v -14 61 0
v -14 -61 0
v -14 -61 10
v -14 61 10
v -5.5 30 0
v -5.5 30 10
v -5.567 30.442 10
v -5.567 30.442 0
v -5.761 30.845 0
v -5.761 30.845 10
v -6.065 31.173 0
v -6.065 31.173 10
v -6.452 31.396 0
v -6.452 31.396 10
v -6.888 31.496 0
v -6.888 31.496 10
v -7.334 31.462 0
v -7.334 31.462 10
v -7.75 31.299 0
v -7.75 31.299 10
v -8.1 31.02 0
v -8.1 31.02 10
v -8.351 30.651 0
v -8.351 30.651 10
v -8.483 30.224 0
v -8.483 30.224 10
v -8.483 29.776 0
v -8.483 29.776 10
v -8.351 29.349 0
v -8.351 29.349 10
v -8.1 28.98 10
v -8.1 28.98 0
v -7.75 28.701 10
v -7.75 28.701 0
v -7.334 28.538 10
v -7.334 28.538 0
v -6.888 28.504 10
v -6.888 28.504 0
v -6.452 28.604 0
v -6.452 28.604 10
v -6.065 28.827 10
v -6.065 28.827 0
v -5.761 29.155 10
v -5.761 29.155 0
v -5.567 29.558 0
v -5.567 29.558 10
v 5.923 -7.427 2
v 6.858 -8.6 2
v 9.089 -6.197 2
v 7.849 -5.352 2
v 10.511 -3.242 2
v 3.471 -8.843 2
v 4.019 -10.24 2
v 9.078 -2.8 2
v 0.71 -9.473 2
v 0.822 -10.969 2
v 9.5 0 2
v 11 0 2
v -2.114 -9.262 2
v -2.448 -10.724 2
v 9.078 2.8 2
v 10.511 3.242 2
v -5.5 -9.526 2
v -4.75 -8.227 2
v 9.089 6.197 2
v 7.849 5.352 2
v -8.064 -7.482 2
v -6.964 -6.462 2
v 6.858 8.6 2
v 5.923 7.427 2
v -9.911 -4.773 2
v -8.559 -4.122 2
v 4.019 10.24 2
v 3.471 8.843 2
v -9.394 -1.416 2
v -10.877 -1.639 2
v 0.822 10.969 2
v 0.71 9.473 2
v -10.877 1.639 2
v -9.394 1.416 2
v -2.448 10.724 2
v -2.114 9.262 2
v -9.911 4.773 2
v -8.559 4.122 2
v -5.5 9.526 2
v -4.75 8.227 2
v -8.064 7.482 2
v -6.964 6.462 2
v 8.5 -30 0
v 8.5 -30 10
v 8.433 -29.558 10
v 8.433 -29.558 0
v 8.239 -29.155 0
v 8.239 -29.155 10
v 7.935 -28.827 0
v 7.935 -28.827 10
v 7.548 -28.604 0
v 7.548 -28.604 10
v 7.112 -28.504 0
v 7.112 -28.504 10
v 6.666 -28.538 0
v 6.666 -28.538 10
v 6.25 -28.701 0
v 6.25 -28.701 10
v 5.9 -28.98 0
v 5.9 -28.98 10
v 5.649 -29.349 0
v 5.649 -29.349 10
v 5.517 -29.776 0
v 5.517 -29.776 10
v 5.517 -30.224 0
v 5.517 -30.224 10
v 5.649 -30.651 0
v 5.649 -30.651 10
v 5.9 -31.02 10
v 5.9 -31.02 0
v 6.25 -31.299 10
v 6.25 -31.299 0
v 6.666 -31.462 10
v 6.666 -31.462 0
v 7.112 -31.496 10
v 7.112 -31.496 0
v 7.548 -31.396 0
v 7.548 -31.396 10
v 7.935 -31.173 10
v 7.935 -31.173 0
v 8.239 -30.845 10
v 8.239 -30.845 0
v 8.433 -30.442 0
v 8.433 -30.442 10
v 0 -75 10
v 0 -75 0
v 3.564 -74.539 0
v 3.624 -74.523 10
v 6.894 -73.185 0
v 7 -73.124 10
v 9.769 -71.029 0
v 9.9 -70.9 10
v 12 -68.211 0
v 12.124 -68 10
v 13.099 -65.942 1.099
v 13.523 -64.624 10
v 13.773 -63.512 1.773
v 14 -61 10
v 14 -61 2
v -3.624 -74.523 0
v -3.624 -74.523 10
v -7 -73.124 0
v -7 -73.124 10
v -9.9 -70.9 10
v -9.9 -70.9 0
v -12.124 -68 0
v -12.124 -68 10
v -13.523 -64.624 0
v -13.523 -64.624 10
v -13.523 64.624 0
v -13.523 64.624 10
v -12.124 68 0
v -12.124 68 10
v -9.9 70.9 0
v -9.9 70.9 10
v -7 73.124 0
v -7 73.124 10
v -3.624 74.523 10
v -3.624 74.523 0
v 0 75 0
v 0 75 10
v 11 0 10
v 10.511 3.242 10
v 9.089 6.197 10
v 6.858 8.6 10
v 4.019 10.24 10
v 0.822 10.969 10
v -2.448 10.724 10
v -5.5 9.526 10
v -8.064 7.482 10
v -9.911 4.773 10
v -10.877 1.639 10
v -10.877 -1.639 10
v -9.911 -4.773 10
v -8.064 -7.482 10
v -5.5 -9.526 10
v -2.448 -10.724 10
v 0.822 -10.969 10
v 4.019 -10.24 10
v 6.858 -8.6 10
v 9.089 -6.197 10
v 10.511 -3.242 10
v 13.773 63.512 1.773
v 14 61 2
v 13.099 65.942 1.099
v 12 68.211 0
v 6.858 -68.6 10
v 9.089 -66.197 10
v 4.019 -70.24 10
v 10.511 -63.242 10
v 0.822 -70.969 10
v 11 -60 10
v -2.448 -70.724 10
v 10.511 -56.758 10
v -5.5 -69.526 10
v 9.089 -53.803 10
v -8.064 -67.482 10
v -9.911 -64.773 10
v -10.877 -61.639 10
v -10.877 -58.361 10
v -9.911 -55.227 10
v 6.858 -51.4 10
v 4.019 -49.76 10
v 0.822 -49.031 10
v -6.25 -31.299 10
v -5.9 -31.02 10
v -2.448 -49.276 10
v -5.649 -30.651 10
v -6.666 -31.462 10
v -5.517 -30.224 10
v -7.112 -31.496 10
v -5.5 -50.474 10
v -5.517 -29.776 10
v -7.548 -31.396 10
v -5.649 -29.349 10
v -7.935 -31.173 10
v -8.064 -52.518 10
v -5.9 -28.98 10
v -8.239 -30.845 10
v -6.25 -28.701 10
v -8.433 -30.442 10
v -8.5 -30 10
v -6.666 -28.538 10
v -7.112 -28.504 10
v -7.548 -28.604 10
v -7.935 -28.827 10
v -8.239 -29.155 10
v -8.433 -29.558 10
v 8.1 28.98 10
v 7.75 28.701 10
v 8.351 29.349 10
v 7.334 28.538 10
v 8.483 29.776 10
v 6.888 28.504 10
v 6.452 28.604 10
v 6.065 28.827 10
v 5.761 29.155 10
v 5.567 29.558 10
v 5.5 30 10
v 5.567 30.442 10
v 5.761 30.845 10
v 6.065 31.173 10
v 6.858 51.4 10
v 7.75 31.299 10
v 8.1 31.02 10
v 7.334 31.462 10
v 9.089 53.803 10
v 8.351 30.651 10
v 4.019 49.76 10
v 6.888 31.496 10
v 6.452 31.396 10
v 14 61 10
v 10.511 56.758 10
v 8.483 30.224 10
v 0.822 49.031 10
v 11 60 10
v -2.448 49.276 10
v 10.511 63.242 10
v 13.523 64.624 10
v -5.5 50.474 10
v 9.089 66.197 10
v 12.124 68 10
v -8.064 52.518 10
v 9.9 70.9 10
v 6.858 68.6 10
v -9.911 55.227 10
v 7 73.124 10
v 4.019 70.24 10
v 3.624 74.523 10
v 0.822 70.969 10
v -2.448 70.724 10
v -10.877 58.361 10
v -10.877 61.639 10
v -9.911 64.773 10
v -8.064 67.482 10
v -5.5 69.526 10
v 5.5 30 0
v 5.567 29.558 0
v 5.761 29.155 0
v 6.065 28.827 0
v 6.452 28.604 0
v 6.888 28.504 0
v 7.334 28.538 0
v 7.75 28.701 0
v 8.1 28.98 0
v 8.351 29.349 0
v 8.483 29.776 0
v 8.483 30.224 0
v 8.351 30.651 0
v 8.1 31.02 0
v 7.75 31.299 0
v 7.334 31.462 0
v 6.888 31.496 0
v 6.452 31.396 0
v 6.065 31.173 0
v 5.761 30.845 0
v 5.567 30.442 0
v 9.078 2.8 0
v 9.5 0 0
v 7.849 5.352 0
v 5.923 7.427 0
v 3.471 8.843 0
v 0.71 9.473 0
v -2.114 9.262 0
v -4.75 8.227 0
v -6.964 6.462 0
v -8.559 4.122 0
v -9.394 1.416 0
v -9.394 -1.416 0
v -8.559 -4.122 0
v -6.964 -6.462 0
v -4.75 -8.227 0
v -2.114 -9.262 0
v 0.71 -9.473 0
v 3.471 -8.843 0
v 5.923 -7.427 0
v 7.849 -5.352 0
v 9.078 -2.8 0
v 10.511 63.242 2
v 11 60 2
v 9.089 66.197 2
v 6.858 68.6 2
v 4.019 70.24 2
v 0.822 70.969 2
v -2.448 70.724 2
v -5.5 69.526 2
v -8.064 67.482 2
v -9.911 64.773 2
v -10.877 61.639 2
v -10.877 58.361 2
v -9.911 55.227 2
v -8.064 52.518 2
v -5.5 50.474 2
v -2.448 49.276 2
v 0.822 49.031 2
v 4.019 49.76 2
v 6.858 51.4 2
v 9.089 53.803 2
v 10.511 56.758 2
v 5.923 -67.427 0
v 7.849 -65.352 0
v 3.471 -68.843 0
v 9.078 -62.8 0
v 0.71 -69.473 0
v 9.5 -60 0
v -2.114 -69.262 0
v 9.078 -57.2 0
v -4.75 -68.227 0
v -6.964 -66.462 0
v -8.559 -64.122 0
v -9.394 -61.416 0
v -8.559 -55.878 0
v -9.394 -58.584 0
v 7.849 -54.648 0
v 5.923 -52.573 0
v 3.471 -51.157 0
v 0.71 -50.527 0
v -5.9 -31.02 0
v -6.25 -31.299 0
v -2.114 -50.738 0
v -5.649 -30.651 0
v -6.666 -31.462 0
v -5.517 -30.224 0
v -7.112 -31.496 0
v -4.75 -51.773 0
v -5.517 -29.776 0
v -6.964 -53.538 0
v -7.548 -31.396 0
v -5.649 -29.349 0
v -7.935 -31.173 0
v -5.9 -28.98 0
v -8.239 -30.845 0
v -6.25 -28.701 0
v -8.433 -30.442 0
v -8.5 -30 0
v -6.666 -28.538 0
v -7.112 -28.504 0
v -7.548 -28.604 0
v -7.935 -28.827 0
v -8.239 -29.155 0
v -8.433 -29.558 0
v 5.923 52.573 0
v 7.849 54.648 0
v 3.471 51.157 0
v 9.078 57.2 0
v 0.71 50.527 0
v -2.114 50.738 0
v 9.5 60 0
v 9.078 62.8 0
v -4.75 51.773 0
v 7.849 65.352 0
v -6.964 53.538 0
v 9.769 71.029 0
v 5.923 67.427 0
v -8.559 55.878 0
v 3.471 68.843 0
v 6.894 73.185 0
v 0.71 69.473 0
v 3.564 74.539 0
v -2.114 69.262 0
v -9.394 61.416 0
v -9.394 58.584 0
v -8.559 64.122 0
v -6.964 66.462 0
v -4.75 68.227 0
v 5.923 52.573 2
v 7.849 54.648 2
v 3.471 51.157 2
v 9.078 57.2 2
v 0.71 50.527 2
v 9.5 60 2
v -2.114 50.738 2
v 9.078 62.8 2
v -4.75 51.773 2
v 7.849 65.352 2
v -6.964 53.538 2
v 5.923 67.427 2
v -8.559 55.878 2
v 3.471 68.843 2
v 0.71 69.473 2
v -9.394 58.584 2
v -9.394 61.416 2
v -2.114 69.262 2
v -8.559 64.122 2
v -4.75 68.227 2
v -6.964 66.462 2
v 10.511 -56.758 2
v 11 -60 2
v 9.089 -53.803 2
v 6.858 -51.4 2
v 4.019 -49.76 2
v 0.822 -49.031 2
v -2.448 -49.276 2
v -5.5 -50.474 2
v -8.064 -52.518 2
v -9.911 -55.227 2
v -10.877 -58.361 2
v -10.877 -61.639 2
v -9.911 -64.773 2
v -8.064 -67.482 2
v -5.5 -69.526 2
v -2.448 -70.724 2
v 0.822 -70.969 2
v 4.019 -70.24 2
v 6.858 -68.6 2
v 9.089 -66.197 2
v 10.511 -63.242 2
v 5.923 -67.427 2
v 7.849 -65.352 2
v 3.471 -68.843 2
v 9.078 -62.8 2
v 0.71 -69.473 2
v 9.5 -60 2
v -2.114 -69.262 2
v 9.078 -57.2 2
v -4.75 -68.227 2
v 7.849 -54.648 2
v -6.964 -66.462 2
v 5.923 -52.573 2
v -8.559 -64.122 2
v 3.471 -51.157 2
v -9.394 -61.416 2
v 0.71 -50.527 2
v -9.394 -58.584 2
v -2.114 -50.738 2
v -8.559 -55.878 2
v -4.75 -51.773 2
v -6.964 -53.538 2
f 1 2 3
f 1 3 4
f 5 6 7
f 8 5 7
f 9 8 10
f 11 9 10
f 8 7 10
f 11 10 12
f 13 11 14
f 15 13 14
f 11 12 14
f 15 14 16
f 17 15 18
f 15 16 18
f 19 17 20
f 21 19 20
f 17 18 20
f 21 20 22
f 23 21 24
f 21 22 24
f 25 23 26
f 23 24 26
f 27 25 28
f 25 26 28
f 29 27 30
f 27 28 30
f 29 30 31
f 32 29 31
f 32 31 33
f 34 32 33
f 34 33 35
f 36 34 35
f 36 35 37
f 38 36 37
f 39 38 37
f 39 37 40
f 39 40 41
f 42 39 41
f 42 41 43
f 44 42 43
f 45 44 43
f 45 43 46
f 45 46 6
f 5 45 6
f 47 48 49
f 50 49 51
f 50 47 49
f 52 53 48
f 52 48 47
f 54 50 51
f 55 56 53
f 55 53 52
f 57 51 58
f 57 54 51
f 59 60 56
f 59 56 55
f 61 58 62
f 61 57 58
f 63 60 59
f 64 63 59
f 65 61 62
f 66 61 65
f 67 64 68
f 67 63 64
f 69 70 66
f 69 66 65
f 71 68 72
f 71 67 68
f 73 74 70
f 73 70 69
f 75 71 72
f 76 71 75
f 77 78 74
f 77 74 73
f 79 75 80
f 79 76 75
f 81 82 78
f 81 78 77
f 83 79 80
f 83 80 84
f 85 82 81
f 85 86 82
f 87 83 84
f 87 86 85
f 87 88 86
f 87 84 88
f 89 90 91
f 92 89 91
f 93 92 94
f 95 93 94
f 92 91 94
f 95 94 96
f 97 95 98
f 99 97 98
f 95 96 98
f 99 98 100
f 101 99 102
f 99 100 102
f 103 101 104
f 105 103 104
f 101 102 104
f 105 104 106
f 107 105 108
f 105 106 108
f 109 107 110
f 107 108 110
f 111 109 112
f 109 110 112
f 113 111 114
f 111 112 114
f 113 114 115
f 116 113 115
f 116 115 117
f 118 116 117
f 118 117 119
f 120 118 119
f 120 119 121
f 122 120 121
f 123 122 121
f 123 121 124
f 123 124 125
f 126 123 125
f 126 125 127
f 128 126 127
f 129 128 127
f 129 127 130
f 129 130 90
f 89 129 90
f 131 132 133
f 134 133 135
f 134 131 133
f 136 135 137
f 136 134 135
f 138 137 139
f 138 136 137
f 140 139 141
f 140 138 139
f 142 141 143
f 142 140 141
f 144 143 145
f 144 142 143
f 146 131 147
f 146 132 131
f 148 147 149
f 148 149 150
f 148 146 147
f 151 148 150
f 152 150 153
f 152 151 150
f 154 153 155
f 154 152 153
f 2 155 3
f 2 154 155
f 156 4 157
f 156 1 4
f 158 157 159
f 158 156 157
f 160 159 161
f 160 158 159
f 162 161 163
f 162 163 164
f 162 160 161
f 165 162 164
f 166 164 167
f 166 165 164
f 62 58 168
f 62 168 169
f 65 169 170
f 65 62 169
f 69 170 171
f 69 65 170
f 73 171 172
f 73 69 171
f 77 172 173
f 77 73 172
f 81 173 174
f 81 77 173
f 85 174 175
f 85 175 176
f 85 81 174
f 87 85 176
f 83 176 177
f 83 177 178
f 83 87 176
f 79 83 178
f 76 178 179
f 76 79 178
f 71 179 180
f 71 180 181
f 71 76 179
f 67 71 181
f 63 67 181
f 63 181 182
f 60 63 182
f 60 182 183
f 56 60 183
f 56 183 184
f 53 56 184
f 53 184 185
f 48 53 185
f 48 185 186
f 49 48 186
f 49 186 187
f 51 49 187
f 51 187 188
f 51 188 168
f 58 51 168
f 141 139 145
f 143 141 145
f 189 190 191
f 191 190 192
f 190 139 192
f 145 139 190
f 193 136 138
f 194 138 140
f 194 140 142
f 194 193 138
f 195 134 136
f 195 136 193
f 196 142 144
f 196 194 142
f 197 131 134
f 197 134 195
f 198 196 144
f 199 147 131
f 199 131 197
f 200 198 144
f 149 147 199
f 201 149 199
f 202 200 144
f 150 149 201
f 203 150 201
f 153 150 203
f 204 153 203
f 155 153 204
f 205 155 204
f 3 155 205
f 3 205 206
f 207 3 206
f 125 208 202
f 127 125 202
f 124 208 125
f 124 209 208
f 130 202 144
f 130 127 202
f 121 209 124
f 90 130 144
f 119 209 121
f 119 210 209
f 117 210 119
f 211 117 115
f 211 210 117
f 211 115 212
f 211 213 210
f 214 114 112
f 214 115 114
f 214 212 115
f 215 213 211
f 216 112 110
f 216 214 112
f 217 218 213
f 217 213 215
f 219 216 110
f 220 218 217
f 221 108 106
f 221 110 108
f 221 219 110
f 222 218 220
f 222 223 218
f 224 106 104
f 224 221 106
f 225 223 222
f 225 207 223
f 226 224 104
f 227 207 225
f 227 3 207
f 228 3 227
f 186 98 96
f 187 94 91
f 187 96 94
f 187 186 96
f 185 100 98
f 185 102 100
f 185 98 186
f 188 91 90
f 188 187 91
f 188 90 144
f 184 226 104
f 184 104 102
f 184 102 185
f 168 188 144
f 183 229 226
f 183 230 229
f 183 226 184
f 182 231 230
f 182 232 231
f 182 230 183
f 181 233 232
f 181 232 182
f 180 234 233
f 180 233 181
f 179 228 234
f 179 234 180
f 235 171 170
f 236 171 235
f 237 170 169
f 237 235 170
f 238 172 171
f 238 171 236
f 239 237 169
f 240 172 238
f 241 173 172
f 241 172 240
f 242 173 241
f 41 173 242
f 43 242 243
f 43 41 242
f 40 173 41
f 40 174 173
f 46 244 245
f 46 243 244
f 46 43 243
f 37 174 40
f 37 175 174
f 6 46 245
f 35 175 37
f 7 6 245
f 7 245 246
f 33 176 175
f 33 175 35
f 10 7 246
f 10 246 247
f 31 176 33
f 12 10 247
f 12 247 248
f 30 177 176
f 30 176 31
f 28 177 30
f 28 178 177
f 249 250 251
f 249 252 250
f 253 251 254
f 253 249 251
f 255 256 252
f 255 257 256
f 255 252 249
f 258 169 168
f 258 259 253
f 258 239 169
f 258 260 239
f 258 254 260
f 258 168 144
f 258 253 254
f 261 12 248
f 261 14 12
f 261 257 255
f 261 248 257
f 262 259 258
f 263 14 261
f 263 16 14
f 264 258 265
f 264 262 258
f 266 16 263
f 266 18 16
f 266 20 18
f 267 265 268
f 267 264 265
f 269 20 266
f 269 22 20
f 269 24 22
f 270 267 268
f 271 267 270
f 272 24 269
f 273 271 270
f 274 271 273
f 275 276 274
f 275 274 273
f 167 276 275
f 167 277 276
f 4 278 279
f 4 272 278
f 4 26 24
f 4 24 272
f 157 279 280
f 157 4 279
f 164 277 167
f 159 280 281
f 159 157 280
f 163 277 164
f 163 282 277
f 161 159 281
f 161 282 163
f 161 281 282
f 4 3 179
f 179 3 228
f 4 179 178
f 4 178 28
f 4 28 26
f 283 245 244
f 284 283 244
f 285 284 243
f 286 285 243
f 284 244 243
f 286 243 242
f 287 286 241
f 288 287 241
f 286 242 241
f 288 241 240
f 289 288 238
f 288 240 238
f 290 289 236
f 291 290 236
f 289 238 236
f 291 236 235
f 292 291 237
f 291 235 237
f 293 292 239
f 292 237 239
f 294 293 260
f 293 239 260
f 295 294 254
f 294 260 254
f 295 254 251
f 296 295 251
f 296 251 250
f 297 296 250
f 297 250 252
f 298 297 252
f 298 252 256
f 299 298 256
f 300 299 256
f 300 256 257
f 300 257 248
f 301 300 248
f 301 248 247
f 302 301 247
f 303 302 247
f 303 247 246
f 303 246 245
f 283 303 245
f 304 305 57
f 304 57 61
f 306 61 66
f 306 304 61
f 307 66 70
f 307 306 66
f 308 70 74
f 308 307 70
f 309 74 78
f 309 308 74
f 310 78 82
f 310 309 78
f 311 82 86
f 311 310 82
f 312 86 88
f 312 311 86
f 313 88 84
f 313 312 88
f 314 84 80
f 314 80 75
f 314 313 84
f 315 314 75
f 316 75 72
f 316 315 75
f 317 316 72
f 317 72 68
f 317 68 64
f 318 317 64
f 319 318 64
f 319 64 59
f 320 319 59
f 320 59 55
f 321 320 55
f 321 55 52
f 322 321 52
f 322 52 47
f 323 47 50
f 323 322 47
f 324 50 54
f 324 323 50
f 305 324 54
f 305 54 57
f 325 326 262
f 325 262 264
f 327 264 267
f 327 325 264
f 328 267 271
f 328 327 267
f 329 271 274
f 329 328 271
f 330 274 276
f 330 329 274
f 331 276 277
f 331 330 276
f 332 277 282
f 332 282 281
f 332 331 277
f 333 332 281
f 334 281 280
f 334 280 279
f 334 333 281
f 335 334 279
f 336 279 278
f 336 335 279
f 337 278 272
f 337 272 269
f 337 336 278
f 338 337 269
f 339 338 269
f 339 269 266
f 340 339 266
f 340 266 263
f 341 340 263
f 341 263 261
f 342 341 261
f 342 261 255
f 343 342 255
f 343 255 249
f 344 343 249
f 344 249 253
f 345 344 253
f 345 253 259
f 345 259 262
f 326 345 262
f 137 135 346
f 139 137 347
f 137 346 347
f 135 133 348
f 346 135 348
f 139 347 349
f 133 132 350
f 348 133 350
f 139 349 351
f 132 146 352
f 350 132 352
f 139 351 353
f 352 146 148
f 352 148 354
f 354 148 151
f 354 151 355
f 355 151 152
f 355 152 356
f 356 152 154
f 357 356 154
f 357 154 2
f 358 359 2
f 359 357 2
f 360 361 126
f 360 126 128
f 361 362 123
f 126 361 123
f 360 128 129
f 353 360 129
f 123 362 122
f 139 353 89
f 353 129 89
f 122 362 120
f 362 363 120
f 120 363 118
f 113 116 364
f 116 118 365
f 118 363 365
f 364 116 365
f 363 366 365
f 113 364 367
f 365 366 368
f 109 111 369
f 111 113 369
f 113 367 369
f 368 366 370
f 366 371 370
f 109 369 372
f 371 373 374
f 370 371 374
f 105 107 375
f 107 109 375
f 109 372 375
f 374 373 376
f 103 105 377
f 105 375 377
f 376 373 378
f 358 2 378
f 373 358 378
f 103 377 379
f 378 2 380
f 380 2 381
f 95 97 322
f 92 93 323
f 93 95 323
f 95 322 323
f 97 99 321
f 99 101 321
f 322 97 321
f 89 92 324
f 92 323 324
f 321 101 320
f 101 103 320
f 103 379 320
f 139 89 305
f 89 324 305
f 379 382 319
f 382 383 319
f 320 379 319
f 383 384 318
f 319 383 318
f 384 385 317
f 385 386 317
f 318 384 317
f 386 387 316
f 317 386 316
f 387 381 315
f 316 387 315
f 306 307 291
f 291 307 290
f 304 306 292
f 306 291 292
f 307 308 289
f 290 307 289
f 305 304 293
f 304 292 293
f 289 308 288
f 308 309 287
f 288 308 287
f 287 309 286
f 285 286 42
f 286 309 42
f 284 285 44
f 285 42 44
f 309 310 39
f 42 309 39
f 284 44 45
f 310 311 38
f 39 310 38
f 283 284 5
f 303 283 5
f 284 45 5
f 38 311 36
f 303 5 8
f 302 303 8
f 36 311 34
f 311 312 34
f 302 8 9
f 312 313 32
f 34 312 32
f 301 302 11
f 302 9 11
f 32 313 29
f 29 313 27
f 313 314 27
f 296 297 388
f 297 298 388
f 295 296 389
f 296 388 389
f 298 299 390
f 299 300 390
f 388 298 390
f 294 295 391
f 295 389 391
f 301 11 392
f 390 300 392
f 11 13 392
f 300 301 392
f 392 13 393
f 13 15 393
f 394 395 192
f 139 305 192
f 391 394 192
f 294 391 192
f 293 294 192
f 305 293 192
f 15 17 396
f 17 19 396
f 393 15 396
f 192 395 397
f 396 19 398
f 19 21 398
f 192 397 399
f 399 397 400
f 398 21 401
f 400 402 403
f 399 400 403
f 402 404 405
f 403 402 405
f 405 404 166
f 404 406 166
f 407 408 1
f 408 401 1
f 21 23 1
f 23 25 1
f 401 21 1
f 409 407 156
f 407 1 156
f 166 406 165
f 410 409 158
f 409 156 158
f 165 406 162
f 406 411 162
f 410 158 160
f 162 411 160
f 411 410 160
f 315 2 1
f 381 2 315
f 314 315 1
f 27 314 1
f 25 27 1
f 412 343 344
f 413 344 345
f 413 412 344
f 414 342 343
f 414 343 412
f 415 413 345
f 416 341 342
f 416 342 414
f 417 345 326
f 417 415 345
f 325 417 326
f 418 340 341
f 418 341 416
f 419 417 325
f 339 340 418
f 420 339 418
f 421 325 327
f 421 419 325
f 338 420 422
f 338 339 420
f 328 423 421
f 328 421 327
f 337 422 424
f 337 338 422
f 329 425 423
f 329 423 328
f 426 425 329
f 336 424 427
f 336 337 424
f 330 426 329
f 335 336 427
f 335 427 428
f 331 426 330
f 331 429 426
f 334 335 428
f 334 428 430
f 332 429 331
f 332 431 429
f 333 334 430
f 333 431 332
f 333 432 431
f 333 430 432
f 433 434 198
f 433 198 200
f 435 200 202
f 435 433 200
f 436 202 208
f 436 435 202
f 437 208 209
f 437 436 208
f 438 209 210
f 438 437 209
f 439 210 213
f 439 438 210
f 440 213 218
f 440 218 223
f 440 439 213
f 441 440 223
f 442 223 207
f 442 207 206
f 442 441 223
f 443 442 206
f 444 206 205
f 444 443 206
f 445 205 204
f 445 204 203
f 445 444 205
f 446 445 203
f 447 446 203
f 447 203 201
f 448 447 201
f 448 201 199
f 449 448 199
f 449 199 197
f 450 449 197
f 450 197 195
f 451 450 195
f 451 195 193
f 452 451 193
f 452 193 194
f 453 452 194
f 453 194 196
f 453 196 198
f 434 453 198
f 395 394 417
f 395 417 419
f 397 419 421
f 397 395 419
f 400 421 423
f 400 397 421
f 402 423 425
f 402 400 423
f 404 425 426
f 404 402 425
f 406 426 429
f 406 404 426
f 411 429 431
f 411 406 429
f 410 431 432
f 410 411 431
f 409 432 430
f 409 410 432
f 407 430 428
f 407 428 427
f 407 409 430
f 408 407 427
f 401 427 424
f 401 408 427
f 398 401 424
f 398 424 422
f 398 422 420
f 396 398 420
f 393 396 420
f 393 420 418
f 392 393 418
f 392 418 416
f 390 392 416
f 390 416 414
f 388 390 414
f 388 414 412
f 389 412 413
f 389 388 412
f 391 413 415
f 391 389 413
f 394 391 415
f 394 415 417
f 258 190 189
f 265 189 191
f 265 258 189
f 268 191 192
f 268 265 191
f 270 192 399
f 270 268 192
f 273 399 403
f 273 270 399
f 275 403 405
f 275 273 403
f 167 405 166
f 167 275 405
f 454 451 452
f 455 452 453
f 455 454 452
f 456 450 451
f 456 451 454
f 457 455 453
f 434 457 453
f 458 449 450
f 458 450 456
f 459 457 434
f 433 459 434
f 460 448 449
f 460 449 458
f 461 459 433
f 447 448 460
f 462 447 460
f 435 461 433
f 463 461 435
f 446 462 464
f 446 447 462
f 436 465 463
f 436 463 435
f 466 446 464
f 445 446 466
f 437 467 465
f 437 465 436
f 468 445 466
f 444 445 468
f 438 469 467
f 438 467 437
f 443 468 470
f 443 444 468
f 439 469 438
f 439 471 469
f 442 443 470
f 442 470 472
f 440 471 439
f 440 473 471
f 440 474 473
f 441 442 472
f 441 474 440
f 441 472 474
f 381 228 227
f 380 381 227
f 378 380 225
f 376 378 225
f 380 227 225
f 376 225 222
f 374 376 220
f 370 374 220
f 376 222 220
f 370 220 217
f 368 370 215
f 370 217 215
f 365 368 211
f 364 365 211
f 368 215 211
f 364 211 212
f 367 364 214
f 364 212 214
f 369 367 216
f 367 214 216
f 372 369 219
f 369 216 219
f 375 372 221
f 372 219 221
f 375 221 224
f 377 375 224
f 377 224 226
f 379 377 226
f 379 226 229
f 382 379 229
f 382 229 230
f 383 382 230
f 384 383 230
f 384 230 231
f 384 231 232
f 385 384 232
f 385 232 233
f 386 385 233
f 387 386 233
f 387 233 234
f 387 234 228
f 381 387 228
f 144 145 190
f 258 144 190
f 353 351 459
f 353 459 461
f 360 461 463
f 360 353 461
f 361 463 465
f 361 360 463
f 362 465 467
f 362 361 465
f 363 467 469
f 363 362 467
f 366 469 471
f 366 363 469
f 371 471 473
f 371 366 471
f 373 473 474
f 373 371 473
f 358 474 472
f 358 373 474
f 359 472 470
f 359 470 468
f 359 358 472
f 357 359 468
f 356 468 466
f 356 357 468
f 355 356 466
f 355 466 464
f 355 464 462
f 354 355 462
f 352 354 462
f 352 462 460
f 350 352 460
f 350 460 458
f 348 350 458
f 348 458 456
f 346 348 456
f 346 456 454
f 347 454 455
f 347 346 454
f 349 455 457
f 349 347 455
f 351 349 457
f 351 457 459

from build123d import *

# Parameters (mm, degrees)
CROQUIS1_W              = 150
CROQUIS1_H              = 28
CROQUIS1_R              = 11
SALIENTE_EXTRUIR1_DEPTH = 10
CROQUIS2_W              = 150
CROQUIS2_H              = 28
CROQUIS2_R              = 9.5
SALIENTE_EXTRUIR2_DEPTH = 2
CHAFL_N1_SIZE           = 2
REDONDEO1_R             = 14
CORTAR_EXTRUIR1_REACH   = 78.948
CROQUIS3_R              = 1.5


with BuildPart() as part:
    # Croquis1 → Saliente-Extruir1 (new body)
    with BuildSketch(Plane(origin=(0, 0, 0), x_dir=(0, 1, 0), z_dir=(0, 0, 1))):
        Rectangle(CROQUIS1_W, CROQUIS1_H)
        with Locations(Location((0, 0, 0), (0, 0, 270))):
            Circle(CROQUIS1_R, mode=Mode.SUBTRACT)
        with Locations(Location((60, 0, 0), (0, 0, 270))):
            Circle(CROQUIS1_R, mode=Mode.SUBTRACT)
        with Locations(Location((-60, 0, 0), (0, 0, 270))):
            Circle(CROQUIS1_R, mode=Mode.SUBTRACT)
    extrude(amount=SALIENTE_EXTRUIR1_DEPTH)

    # Croquis2 → Saliente-Extruir2 (add)
    with BuildSketch(Plane(origin=(0, 0, 0), x_dir=(0, 1, 0), z_dir=(0, 0, 1))):
        Rectangle(CROQUIS2_W, CROQUIS2_H)
        with Locations(Location((0, 0, 0), (0, 0, 270))):
            Circle(CROQUIS2_R, mode=Mode.SUBTRACT)
        with Locations(Location((60, 0, 0), (0, 0, 270))):
            Circle(CROQUIS2_R, mode=Mode.SUBTRACT)
        with Locations(Location((-60, 0, 0), (0, 0, 270))):
            Circle(CROQUIS2_R, mode=Mode.SUBTRACT)
    extrude(amount=SALIENTE_EXTRUIR2_DEPTH)

    # Chaflán1
    chafl_n1_edges = [part.edges().sort_by_distance(p)[0] for p in [
        (14, 0, 0),
    ]]
    chamfer(chafl_n1_edges, length=CHAFL_N1_SIZE)

    # Redondeo1
    redondeo1_edges = [part.edges().sort_by_distance(p)[0] for p in [
        (14, 75, 6),
        (-14, 75, 5),
        (14, -75, 6),
        (-14, -75, 5),
    ]]
    fillet(redondeo1_edges, radius=REDONDEO1_R - 0.0001)  # a hair under: the kernel refuses the full size

    # Croquis3 → Cortar-Extruir1 (cut, up to next)
    with BuildSketch(Plane.XY.offset(10), mode=Mode.PRIVATE) as cortar_extruir1_sk1:
        with Locations((-7, 30)):
            Circle(CROQUIS3_R)
    cortar_extruir1_tool1 = extrude(cortar_extruir1_sk1.sketch, amount=-CORTAR_EXTRUIR1_REACH, mode=Mode.PRIVATE) & part.part
    # Croquis3 → Cortar-Extruir1 (cut, up to next)
    with BuildSketch(Plane.XY.offset(10), mode=Mode.PRIVATE) as cortar_extruir1_sk2:
        with Locations(Location((7, 30, 0), (0, 0, 180))):
            Circle(CROQUIS3_R)
    cortar_extruir1_tool2 = extrude(cortar_extruir1_sk2.sketch, amount=-CORTAR_EXTRUIR1_REACH, mode=Mode.PRIVATE) & part.part
    # Croquis3 → Cortar-Extruir1 (cut, up to next)
    with BuildSketch(Plane.XY.offset(10), mode=Mode.PRIVATE) as cortar_extruir1_sk3:
        with Locations((7, -30)):
            Circle(CROQUIS3_R)
    cortar_extruir1_tool3 = extrude(cortar_extruir1_sk3.sketch, amount=-CORTAR_EXTRUIR1_REACH, mode=Mode.PRIVATE) & part.part
    # Croquis3 → Cortar-Extruir1 (cut, up to next)
    with BuildSketch(Plane.XY.offset(10), mode=Mode.PRIVATE) as cortar_extruir1_sk4:
        with Locations(Location((-7, -30, 0), (0, 0, 180))):
            Circle(CROQUIS3_R)
    cortar_extruir1_tool4 = extrude(cortar_extruir1_sk4.sketch, amount=-CORTAR_EXTRUIR1_REACH, mode=Mode.PRIVATE) & part.part
    add(cortar_extruir1_tool1.solids().sort_by_distance((-7, 30, 10))[0], mode=Mode.SUBTRACT)
    add(cortar_extruir1_tool2.solids().sort_by_distance((7, 30, 10))[0], mode=Mode.SUBTRACT)
    add(cortar_extruir1_tool3.solids().sort_by_distance((7, -30, 10))[0], mode=Mode.SUBTRACT)
    add(cortar_extruir1_tool4.solids().sort_by_distance((-7, -30, 10))[0], mode=Mode.SUBTRACT)


solid = part.part
